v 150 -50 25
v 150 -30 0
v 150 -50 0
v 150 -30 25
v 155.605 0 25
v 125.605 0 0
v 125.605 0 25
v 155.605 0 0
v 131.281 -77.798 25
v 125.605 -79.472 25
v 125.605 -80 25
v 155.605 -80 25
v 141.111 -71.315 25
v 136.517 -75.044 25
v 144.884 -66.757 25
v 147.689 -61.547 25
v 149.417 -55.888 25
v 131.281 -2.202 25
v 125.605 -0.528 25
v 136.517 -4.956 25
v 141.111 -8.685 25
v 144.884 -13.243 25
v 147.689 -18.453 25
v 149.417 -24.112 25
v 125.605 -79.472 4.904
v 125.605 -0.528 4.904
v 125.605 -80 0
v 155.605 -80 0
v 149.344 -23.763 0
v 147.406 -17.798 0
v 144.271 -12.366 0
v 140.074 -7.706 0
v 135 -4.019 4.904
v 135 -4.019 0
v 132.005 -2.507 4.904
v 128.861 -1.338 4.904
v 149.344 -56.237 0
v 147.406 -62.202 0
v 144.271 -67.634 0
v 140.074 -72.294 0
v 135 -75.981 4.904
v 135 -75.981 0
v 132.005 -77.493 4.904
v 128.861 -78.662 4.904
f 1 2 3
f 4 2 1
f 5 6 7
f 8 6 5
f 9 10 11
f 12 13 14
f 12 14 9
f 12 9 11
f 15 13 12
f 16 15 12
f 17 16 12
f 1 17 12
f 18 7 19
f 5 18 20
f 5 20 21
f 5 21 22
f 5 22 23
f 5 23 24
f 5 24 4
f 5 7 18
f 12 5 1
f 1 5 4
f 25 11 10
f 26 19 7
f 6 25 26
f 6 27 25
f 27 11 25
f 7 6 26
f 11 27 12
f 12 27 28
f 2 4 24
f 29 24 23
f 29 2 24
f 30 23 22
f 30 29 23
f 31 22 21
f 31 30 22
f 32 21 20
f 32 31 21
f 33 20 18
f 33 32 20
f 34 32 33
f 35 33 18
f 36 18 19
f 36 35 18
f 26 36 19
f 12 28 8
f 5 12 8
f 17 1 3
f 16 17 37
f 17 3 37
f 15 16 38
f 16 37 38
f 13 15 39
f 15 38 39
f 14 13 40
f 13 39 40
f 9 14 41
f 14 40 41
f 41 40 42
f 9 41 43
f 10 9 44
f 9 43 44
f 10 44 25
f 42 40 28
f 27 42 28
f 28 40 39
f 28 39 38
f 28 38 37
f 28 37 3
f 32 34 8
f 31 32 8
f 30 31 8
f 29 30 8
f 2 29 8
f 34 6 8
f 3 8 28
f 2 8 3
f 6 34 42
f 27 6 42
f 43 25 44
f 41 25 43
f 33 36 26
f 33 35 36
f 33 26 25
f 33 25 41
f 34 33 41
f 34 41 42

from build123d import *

# Parameters (mm, degrees)
F1_DEPTH    = 80
F2_T1_DEPTH = 140
F2_T3_DEPTH = 85
F2_T6_ANGLE = 90
F2_T8_ANGLE = 90
F3_W        = 30
F3_H        = 80
F4_DEPTH    = 25


# Not quite as in the source:
# - a fillet or chamfer that OpenCascade refuses, or shapes differently, is made with other operations: its cross-section is extruded or revolved along the edge and cut away or added


with BuildPart() as f1:
    # F0 (on Front) → F1 (new body)
    with BuildSketch(Plane.XZ):
        with BuildLine():
            Line((85, 129.9038105677), (75, 129.9038105677))
            Line((75, 129.9038105677), (0, 0))
            Line((0, 0), (16.9389196682, 0))
            Line((16.9389196682, 0), (16.9389196682, 4.9038105677))
            Line((16.9389196682, 4.9038105677), (34.5854811567, 4.9038105677))
            Line((34.5854811567, 4.9038105677), (34.5854811567, 6.5063509461))
            ThreePointArc((34.5854811567, 6.5063509461), (36.2891898423, 19.4473032012), (41.2842109675, 31.5063509461))
            Line((41.2842109675, 31.5063509461), (86.5319459163, 109.8777268049))
            ThreePointArc((86.5319459163, 109.8777268049), (117.3568969946, 96.1773012088), (130, 64.9038105677))
            ThreePointArc((130, 64.9038105677), (127.4711560413, 41.3606586971), (120, 18.8916382651))
            Line((120, 18.8916382651), (120, 4.9038105677))
            Line((120, 4.9038105677), (135, 4.9038105677))
            Line((135, 4.9038105677), (135, -0.0961894323))
            Line((135, -0.0961894323), (150, -0.0961894323))
            Line((150, -0.0961894323), (150, 64.9038105677))
            ThreePointArc((150, 64.9038105677), (130.9619407771, 110.8657513448), (85, 129.9038105677))
        make_face()
    extrude(amount=F1_DEPTH)

    # F2: fillet of radius 30 on 2 edges, made by hand

    # F2_s2 → F2_t1 (cut)
    with BuildSketch(Plane.XY.offset(-75.0961894323)):
        with BuildLine():
            ThreePointArc((150, -50), (141.2132034356, -71.2132034356), (120, -80))
            Line((120, -80), (150, -80))
            Line((150, -80), (150, -50))
        make_face()
        with BuildLine():
            ThreePointArc((150, -30), (141.2132034356, -8.7867965644), (120, 0))
            Line((120, 0), (150, 0))
            Line((150, 0), (150, -30))
        make_face()
    extrude(amount=F2_T1_DEPTH, mode=Mode.SUBTRACT)

    # F2_s4 → F2_t3 (cut)
    with BuildSketch(Plane.YZ):
        with BuildLine():
            ThreePointArc((-50, 129.9038105677), (-71.2132034356, 121.1170140033), (-80, 99.9038105677))
            Line((-80, 99.9038105677), (-80, 129.9038105677))
            Line((-80, 129.9038105677), (-50, 129.9038105677))
        make_face()
        with BuildLine():
            ThreePointArc((-30, 129.9038105677), (-8.7867965644, 121.1170140033), (0, 99.9038105677))
            Line((0, 99.9038105677), (0, 129.9038105677))
            Line((0, 129.9038105677), (-30, 129.9038105677))
        make_face()
    extrude(amount=F2_T3_DEPTH, mode=Mode.SUBTRACT)

    # F2_s5 → F2_t6 (revolve, cut)
    with BuildSketch(Plane.XY.offset(64.9038105677)):
        with BuildLine():
            ThreePointArc((150, -30), (141.2132034356, -8.7867965644), (120, 0))
            Line((120, 0), (150, 0))
            Line((150, 0), (150, -30))
        make_face()
    revolve(axis=Axis((85, 0, 64.9038105677), (0, -1, 0)), revolution_arc=F2_T6_ANGLE, mode=Mode.SUBTRACT)

    # F2_s7 → F2_t8 (revolve, cut)
    with BuildSketch(Plane.XY.offset(64.9038105677)):
        with BuildLine():
            ThreePointArc((150, -50), (141.2132034356, -71.2132034356), (120, -80))
            Line((120, -80), (150, -80))
            Line((150, -80), (150, -50))
        make_face()
    revolve(axis=Axis((85, -80, 64.9038105677), (0, -1, 0)), revolution_arc=F2_T8_ANGLE, mode=Mode.SUBTRACT)


with BuildPart() as f4:
    # F3 (on Top) → F4 (new body)
    with BuildSketch(Plane.XY):
        with Locations((140.605225563, -40)):
            Rectangle(F3_W, F3_H)
    extrude(amount=F4_DEPTH)

    # F5: cut F1
    add(f1.part, mode=Mode.SUBTRACT)


solid = f4.part
